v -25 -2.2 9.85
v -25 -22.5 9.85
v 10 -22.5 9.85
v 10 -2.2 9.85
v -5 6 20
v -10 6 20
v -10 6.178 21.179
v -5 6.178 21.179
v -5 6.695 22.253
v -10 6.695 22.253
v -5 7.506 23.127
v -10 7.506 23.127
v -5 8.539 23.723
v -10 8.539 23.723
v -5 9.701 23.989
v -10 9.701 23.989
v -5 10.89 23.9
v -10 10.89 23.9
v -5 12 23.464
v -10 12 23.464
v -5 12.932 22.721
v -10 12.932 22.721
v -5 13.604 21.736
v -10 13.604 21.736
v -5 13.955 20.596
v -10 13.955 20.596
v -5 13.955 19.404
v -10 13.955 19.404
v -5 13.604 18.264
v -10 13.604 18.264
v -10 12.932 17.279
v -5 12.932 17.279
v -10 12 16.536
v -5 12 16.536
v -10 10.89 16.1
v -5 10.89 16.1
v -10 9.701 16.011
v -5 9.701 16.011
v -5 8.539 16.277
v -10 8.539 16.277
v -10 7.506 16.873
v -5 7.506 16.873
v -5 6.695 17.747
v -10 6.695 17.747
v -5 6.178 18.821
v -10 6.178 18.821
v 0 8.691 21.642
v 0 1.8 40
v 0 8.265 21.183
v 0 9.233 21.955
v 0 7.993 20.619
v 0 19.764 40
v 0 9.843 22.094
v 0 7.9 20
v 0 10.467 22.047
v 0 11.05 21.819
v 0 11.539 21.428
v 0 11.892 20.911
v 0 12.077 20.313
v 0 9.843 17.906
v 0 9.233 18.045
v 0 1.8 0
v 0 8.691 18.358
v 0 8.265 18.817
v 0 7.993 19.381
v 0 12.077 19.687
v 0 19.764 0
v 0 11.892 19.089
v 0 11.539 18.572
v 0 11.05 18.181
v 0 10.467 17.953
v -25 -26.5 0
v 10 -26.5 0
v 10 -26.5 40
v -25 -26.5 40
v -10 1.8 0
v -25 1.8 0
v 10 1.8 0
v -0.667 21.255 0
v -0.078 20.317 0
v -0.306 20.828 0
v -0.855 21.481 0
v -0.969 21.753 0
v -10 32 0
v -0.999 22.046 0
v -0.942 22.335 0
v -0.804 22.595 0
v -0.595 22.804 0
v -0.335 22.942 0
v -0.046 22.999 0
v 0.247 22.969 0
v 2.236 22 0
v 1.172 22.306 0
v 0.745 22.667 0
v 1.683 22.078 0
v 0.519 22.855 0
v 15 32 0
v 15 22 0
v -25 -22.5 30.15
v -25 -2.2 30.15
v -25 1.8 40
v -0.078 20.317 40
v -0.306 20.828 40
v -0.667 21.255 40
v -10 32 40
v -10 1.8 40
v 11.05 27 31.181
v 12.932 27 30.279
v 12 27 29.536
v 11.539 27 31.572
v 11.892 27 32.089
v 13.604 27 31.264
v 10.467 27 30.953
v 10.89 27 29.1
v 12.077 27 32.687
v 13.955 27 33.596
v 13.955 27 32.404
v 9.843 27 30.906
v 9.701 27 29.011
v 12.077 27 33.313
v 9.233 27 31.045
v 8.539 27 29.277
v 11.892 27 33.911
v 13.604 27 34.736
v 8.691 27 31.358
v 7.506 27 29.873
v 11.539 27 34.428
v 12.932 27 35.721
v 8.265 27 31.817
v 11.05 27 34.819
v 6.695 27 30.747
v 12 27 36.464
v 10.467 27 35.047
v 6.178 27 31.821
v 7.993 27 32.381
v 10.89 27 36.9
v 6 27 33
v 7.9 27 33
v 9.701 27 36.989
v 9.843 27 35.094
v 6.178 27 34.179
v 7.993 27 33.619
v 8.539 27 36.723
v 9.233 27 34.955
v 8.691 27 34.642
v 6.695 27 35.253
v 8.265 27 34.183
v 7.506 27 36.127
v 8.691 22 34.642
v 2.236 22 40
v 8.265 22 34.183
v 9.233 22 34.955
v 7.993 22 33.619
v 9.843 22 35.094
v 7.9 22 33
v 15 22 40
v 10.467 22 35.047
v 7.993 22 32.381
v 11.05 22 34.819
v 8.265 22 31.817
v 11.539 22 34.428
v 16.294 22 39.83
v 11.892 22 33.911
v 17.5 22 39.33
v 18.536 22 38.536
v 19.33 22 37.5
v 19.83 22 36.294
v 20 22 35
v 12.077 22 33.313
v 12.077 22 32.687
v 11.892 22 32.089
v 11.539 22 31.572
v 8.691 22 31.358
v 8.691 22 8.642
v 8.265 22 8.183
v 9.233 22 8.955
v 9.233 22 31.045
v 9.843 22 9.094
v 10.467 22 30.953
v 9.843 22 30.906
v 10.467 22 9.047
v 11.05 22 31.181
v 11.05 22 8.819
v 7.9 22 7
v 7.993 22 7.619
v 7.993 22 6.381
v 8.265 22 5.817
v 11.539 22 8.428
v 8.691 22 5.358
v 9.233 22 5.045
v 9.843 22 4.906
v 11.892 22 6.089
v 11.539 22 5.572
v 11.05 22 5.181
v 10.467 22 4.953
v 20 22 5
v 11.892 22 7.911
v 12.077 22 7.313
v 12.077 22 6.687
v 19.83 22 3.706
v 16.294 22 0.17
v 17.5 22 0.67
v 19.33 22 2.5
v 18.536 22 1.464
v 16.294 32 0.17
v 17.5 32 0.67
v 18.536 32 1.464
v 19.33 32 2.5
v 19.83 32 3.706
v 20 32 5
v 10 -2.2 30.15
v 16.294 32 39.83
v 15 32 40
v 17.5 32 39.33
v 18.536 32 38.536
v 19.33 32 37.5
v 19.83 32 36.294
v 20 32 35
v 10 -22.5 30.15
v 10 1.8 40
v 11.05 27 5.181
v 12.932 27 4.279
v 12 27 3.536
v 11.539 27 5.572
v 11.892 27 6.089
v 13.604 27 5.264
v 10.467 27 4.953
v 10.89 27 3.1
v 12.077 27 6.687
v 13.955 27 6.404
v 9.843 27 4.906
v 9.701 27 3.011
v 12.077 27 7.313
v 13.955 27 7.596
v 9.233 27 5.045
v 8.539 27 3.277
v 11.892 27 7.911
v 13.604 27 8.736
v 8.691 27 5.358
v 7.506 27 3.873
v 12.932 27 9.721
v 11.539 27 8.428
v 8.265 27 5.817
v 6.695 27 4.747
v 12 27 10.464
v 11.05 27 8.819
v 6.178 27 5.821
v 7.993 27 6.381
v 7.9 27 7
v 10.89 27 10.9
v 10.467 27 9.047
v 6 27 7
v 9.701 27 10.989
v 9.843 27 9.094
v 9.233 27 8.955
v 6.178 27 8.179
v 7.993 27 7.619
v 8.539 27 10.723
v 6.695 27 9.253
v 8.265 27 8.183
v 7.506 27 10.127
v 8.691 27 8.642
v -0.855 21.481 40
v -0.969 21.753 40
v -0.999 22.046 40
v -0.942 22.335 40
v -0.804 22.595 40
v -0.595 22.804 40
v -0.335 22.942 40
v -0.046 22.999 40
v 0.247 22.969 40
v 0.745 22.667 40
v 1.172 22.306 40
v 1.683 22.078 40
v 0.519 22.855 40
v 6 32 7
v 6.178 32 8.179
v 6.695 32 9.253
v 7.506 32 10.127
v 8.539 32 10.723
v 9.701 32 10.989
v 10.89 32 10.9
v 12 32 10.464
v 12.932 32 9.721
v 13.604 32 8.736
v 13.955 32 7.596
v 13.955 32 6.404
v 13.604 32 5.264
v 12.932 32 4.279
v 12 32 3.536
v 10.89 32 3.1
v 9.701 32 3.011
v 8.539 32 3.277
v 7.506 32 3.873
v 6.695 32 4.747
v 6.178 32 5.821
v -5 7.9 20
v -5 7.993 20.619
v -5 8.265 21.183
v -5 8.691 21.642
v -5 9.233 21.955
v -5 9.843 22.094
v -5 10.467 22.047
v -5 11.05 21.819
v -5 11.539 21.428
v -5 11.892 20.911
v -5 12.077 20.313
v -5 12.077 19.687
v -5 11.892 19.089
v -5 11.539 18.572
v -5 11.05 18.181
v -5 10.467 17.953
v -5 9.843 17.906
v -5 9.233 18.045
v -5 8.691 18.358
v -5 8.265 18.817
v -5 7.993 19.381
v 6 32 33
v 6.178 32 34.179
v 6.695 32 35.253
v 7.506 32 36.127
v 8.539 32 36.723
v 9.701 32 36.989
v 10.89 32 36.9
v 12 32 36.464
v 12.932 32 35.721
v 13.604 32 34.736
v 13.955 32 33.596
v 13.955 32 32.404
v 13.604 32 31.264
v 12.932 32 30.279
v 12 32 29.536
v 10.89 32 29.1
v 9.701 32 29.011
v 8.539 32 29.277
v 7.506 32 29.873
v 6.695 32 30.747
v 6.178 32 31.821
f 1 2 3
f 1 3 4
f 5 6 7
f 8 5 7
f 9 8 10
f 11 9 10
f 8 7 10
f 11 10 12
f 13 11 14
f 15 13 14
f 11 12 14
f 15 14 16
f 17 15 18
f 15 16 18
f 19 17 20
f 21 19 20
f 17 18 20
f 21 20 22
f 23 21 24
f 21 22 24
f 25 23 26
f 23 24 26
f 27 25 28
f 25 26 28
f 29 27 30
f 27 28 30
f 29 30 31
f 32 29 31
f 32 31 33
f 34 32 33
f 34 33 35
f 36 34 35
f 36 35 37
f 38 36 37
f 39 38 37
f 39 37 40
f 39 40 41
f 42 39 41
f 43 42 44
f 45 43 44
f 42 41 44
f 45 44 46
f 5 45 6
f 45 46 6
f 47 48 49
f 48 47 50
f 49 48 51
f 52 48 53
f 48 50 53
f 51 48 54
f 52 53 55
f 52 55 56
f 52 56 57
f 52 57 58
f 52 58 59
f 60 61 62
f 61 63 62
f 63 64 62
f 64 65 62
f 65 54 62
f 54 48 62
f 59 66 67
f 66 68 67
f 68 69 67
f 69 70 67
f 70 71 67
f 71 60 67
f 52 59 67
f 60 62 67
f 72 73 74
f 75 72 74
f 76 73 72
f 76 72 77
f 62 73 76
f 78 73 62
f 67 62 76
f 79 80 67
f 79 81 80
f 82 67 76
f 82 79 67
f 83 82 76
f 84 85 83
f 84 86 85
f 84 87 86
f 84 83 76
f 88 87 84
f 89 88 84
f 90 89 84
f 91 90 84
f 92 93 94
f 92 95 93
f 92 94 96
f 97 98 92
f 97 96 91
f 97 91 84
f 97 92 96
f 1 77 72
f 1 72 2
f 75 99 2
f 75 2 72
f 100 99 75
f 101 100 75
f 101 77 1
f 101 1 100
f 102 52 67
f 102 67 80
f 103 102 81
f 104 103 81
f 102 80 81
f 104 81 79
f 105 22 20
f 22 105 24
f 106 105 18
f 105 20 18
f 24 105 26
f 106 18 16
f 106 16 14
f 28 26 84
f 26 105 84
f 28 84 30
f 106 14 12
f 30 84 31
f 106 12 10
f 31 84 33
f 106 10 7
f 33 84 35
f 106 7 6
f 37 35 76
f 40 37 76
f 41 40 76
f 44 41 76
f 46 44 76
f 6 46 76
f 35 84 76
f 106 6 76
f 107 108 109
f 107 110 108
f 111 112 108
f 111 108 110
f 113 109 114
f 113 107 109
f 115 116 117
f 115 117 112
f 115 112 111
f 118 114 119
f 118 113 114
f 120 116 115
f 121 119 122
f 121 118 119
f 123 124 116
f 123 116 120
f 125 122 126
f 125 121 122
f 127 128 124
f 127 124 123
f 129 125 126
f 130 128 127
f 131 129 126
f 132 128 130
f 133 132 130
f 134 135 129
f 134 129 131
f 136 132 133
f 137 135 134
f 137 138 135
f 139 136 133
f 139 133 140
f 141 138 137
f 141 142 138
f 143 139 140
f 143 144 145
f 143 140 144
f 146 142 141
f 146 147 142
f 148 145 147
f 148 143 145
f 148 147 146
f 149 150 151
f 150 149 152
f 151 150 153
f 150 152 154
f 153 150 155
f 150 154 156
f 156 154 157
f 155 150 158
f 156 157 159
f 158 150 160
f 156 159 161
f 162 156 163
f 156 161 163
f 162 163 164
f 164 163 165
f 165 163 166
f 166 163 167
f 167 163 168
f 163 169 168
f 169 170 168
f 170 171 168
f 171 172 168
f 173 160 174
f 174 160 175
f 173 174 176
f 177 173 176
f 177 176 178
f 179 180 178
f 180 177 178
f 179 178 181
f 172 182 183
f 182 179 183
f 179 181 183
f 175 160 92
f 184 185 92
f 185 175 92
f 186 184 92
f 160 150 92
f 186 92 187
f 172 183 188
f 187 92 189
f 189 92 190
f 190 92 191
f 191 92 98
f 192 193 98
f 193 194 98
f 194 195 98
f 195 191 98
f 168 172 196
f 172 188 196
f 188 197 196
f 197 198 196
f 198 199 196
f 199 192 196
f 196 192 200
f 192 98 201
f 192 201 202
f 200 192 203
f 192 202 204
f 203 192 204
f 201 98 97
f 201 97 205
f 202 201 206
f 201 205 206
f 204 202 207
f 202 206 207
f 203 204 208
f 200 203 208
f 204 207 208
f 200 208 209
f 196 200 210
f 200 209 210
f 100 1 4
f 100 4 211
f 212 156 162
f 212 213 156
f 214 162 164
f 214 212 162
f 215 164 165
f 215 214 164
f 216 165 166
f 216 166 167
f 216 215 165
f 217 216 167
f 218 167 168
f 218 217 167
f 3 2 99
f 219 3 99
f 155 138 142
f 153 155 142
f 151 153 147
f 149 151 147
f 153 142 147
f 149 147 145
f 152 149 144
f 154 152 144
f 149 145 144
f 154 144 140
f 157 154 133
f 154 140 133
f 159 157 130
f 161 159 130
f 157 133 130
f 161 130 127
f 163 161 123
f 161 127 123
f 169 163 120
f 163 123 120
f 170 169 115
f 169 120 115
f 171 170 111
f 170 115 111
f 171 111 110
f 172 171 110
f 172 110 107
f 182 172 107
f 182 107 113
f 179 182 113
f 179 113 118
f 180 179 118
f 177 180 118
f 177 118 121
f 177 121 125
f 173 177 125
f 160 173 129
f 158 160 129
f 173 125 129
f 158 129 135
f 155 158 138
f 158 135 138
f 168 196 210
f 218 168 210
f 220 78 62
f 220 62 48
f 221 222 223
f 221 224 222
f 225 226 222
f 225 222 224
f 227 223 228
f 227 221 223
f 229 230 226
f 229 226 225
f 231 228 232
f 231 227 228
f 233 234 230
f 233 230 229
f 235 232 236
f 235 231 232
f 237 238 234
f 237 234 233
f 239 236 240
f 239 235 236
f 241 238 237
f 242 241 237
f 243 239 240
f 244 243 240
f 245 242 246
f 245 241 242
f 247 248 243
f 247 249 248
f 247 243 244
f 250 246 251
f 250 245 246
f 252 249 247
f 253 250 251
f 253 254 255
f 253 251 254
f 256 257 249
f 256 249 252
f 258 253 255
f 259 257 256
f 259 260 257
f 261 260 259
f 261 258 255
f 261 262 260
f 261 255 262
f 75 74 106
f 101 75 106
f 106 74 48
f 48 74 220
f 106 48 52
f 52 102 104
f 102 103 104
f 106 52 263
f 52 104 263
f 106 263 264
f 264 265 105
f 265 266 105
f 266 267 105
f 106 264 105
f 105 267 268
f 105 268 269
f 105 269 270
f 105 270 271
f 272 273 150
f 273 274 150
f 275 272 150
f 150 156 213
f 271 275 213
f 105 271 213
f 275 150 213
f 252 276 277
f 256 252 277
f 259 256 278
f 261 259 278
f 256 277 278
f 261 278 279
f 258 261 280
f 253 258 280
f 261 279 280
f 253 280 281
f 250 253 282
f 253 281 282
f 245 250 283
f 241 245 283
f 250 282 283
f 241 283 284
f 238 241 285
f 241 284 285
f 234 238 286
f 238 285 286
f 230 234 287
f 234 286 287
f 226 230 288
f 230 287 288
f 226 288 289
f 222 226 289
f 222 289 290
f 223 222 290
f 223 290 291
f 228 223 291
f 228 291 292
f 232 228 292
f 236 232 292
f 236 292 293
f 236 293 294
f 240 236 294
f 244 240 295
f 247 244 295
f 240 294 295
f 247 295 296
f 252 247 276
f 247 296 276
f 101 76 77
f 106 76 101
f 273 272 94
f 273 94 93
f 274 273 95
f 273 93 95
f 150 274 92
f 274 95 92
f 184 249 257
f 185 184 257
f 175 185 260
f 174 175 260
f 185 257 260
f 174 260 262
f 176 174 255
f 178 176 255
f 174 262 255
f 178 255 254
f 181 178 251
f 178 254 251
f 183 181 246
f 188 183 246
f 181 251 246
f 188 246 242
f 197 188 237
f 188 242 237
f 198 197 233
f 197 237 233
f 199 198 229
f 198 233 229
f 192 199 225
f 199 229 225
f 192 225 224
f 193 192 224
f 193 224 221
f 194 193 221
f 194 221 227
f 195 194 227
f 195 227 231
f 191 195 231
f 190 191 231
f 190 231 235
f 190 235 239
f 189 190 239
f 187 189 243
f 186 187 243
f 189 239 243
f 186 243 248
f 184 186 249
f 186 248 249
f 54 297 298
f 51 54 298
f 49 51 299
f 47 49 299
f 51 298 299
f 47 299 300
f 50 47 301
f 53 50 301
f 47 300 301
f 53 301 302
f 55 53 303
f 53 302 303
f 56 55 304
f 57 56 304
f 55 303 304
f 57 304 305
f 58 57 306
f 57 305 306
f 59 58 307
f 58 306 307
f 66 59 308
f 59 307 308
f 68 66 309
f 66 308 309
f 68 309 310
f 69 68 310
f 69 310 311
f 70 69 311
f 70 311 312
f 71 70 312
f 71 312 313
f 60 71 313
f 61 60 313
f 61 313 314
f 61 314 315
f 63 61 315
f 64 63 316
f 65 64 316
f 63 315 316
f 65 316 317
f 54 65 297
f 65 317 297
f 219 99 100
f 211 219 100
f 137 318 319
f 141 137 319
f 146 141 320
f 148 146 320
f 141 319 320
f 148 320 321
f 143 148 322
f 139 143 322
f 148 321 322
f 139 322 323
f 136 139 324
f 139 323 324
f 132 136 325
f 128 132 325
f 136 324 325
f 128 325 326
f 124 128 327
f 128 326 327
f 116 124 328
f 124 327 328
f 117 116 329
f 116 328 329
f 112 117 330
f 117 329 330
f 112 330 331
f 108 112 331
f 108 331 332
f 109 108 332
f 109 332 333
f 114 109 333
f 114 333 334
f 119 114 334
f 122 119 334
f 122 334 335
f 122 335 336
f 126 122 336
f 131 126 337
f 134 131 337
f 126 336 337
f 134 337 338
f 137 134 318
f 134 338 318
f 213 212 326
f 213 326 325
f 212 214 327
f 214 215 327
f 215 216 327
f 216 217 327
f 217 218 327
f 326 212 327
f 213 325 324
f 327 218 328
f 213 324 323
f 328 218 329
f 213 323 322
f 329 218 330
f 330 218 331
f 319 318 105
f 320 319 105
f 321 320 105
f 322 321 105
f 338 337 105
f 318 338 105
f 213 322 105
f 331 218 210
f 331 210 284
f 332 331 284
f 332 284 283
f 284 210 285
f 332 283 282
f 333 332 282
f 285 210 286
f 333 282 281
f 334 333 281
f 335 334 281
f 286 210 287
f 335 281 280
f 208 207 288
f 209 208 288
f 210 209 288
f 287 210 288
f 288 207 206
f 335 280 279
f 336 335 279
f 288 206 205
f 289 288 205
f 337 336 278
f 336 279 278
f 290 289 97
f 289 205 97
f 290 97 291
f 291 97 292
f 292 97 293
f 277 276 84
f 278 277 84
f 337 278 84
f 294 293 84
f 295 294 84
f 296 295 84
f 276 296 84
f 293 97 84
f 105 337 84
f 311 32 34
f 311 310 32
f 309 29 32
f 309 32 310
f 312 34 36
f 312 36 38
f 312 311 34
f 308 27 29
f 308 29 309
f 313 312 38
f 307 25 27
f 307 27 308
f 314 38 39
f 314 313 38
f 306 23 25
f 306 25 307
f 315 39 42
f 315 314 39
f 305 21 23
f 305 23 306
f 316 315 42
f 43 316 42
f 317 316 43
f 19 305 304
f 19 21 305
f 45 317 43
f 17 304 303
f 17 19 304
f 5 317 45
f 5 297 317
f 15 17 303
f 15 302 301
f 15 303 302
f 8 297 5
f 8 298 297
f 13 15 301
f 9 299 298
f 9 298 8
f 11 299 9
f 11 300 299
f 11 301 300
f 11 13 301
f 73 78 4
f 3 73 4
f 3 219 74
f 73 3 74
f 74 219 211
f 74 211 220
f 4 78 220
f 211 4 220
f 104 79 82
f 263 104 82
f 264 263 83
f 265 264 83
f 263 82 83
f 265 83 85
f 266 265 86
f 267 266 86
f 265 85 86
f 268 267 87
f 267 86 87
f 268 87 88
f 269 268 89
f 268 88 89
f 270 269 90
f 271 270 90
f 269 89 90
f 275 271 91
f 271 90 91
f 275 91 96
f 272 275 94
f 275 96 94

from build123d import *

# Parameters (mm, degrees)
DODANIE_WYCI_GNI_CIE1_DEPTH = 40
SZKIC7_R                    = 4
WYTNIJ_WYCI_GNI_CIE2_DEPTH  = 5
SZKIC8_R                    = 2.1
WYTNIJ_WYCI_GNI_CIE3_DEPTH  = 5
SZKIC9_R                    = 4
WYTNIJ_WYCI_GNI_CIE4_DEPTH  = 5
SZKIC10_R                   = 2.1
WYTNIJ_WYCI_GNI_CIE5_DEPTH  = 5
ZAOKR_GLENIE1_R             = 5
BOSS_EXTRUDE1_DEPTH         = 15
BOSS_EXTRUDE1_DEPTH_BACK    = 20.0001
SKETCH1_W                   = 40
SKETCH1_H                   = 28.3
SKETCH1_W_2                 = 20.3
SKETCH1_H_2                 = 20.3


with BuildPart() as part:
    # Szkic1 → Dodanie-wyciągnięcie1 (new body)
    with BuildSketch(Plane.XY):
        with BuildLine():
            Line((0, 0), (0, 19.763932023))
            ThreePointArc((0, 19.763932023), (-0.174258142, 20.580428603), (-0.666666667, 21.254644008))
            ThreePointArc((-0.666666667, 21.254644008), (-0.707106781, 22.707106781), (0.745355992, 22.666666667))
            ThreePointArc((0.745355992, 22.666666667), (1.419571397, 22.174258142), (2.236067977, 22))
            Line((2.236067977, 22), (20, 22))
            Line((20, 22), (20, 32))
            Line((20, 32), (-10, 32))
            Line((-10, 32), (-10, 0))
            Line((-10, 0), (0, 0))
        make_face()
    extrude(amount=DODANIE_WYCI_GNI_CIE1_DEPTH)

    # Szkic7 → Wytnij-wyciągnięcie2 (cut)
    with BuildSketch(Plane.ZY.offset(10)):
        with Locations(Location((20, 10, 0), (0, 0, 270))):
            Circle(SZKIC7_R)
    extrude(amount=-WYTNIJ_WYCI_GNI_CIE2_DEPTH, mode=Mode.SUBTRACT)

    # Szkic8 → Wytnij-wyciągnięcie3 (cut)
    with BuildSketch(Plane.ZY.offset(5)):
        with Locations(Location((20, 10, 0), (0, 0, 270))):
            Circle(SZKIC8_R)
    extrude(amount=-WYTNIJ_WYCI_GNI_CIE3_DEPTH, mode=Mode.SUBTRACT)

    # Szkic9 → Wytnij-wyciągnięcie4 (cut)
    with BuildSketch(Plane(origin=(0, 32, 0), x_dir=(1, 0, 0), z_dir=(0, 1, 0))):
        with Locations(Location((10, -33, 0), (0, 0, 180))):
            Circle(SZKIC9_R)
        with Locations(Location((10, -7, 0), (0, 0, 180))):
            Circle(SZKIC9_R)
    extrude(amount=-WYTNIJ_WYCI_GNI_CIE4_DEPTH, mode=Mode.SUBTRACT)

    # Szkic10 → Wytnij-wyciągnięcie5 (cut)
    with BuildSketch(Plane(origin=(0, 27, 0), x_dir=(1, 0, 0), z_dir=(0, 1, 0))):
        with Locations(Location((10, -33, 0), (0, 0, 180))):
            Circle(SZKIC10_R)
        with Locations(Location((10, -7, 0), (0, 0, 180))):
            Circle(SZKIC10_R)
    extrude(amount=-WYTNIJ_WYCI_GNI_CIE5_DEPTH, mode=Mode.SUBTRACT)

    # Zaokrąglenie1
    zaokr_glenie1_edges = [part.edges().sort_by_distance(p)[0] for p in [
        (20, 27, 0),
        (20, 27, 40),
    ]]
    fillet(zaokr_glenie1_edges, radius=ZAOKR_GLENIE1_R)

    # Sketch1 → Boss-Extrude1 (add, two sides: drawn at the far end of the back side and taken through both)
    with BuildSketch(Plane.ZY.offset(10).offset(-BOSS_EXTRUDE1_DEPTH_BACK)):
        with Locations((20, -12.35)):
            Rectangle(SKETCH1_W, SKETCH1_H)
        with Locations((20, -12.35)):
            Rectangle(SKETCH1_W_2, SKETCH1_H_2, mode=Mode.SUBTRACT)
    extrude(amount=BOSS_EXTRUDE1_DEPTH + BOSS_EXTRUDE1_DEPTH_BACK)


solid = part.part
